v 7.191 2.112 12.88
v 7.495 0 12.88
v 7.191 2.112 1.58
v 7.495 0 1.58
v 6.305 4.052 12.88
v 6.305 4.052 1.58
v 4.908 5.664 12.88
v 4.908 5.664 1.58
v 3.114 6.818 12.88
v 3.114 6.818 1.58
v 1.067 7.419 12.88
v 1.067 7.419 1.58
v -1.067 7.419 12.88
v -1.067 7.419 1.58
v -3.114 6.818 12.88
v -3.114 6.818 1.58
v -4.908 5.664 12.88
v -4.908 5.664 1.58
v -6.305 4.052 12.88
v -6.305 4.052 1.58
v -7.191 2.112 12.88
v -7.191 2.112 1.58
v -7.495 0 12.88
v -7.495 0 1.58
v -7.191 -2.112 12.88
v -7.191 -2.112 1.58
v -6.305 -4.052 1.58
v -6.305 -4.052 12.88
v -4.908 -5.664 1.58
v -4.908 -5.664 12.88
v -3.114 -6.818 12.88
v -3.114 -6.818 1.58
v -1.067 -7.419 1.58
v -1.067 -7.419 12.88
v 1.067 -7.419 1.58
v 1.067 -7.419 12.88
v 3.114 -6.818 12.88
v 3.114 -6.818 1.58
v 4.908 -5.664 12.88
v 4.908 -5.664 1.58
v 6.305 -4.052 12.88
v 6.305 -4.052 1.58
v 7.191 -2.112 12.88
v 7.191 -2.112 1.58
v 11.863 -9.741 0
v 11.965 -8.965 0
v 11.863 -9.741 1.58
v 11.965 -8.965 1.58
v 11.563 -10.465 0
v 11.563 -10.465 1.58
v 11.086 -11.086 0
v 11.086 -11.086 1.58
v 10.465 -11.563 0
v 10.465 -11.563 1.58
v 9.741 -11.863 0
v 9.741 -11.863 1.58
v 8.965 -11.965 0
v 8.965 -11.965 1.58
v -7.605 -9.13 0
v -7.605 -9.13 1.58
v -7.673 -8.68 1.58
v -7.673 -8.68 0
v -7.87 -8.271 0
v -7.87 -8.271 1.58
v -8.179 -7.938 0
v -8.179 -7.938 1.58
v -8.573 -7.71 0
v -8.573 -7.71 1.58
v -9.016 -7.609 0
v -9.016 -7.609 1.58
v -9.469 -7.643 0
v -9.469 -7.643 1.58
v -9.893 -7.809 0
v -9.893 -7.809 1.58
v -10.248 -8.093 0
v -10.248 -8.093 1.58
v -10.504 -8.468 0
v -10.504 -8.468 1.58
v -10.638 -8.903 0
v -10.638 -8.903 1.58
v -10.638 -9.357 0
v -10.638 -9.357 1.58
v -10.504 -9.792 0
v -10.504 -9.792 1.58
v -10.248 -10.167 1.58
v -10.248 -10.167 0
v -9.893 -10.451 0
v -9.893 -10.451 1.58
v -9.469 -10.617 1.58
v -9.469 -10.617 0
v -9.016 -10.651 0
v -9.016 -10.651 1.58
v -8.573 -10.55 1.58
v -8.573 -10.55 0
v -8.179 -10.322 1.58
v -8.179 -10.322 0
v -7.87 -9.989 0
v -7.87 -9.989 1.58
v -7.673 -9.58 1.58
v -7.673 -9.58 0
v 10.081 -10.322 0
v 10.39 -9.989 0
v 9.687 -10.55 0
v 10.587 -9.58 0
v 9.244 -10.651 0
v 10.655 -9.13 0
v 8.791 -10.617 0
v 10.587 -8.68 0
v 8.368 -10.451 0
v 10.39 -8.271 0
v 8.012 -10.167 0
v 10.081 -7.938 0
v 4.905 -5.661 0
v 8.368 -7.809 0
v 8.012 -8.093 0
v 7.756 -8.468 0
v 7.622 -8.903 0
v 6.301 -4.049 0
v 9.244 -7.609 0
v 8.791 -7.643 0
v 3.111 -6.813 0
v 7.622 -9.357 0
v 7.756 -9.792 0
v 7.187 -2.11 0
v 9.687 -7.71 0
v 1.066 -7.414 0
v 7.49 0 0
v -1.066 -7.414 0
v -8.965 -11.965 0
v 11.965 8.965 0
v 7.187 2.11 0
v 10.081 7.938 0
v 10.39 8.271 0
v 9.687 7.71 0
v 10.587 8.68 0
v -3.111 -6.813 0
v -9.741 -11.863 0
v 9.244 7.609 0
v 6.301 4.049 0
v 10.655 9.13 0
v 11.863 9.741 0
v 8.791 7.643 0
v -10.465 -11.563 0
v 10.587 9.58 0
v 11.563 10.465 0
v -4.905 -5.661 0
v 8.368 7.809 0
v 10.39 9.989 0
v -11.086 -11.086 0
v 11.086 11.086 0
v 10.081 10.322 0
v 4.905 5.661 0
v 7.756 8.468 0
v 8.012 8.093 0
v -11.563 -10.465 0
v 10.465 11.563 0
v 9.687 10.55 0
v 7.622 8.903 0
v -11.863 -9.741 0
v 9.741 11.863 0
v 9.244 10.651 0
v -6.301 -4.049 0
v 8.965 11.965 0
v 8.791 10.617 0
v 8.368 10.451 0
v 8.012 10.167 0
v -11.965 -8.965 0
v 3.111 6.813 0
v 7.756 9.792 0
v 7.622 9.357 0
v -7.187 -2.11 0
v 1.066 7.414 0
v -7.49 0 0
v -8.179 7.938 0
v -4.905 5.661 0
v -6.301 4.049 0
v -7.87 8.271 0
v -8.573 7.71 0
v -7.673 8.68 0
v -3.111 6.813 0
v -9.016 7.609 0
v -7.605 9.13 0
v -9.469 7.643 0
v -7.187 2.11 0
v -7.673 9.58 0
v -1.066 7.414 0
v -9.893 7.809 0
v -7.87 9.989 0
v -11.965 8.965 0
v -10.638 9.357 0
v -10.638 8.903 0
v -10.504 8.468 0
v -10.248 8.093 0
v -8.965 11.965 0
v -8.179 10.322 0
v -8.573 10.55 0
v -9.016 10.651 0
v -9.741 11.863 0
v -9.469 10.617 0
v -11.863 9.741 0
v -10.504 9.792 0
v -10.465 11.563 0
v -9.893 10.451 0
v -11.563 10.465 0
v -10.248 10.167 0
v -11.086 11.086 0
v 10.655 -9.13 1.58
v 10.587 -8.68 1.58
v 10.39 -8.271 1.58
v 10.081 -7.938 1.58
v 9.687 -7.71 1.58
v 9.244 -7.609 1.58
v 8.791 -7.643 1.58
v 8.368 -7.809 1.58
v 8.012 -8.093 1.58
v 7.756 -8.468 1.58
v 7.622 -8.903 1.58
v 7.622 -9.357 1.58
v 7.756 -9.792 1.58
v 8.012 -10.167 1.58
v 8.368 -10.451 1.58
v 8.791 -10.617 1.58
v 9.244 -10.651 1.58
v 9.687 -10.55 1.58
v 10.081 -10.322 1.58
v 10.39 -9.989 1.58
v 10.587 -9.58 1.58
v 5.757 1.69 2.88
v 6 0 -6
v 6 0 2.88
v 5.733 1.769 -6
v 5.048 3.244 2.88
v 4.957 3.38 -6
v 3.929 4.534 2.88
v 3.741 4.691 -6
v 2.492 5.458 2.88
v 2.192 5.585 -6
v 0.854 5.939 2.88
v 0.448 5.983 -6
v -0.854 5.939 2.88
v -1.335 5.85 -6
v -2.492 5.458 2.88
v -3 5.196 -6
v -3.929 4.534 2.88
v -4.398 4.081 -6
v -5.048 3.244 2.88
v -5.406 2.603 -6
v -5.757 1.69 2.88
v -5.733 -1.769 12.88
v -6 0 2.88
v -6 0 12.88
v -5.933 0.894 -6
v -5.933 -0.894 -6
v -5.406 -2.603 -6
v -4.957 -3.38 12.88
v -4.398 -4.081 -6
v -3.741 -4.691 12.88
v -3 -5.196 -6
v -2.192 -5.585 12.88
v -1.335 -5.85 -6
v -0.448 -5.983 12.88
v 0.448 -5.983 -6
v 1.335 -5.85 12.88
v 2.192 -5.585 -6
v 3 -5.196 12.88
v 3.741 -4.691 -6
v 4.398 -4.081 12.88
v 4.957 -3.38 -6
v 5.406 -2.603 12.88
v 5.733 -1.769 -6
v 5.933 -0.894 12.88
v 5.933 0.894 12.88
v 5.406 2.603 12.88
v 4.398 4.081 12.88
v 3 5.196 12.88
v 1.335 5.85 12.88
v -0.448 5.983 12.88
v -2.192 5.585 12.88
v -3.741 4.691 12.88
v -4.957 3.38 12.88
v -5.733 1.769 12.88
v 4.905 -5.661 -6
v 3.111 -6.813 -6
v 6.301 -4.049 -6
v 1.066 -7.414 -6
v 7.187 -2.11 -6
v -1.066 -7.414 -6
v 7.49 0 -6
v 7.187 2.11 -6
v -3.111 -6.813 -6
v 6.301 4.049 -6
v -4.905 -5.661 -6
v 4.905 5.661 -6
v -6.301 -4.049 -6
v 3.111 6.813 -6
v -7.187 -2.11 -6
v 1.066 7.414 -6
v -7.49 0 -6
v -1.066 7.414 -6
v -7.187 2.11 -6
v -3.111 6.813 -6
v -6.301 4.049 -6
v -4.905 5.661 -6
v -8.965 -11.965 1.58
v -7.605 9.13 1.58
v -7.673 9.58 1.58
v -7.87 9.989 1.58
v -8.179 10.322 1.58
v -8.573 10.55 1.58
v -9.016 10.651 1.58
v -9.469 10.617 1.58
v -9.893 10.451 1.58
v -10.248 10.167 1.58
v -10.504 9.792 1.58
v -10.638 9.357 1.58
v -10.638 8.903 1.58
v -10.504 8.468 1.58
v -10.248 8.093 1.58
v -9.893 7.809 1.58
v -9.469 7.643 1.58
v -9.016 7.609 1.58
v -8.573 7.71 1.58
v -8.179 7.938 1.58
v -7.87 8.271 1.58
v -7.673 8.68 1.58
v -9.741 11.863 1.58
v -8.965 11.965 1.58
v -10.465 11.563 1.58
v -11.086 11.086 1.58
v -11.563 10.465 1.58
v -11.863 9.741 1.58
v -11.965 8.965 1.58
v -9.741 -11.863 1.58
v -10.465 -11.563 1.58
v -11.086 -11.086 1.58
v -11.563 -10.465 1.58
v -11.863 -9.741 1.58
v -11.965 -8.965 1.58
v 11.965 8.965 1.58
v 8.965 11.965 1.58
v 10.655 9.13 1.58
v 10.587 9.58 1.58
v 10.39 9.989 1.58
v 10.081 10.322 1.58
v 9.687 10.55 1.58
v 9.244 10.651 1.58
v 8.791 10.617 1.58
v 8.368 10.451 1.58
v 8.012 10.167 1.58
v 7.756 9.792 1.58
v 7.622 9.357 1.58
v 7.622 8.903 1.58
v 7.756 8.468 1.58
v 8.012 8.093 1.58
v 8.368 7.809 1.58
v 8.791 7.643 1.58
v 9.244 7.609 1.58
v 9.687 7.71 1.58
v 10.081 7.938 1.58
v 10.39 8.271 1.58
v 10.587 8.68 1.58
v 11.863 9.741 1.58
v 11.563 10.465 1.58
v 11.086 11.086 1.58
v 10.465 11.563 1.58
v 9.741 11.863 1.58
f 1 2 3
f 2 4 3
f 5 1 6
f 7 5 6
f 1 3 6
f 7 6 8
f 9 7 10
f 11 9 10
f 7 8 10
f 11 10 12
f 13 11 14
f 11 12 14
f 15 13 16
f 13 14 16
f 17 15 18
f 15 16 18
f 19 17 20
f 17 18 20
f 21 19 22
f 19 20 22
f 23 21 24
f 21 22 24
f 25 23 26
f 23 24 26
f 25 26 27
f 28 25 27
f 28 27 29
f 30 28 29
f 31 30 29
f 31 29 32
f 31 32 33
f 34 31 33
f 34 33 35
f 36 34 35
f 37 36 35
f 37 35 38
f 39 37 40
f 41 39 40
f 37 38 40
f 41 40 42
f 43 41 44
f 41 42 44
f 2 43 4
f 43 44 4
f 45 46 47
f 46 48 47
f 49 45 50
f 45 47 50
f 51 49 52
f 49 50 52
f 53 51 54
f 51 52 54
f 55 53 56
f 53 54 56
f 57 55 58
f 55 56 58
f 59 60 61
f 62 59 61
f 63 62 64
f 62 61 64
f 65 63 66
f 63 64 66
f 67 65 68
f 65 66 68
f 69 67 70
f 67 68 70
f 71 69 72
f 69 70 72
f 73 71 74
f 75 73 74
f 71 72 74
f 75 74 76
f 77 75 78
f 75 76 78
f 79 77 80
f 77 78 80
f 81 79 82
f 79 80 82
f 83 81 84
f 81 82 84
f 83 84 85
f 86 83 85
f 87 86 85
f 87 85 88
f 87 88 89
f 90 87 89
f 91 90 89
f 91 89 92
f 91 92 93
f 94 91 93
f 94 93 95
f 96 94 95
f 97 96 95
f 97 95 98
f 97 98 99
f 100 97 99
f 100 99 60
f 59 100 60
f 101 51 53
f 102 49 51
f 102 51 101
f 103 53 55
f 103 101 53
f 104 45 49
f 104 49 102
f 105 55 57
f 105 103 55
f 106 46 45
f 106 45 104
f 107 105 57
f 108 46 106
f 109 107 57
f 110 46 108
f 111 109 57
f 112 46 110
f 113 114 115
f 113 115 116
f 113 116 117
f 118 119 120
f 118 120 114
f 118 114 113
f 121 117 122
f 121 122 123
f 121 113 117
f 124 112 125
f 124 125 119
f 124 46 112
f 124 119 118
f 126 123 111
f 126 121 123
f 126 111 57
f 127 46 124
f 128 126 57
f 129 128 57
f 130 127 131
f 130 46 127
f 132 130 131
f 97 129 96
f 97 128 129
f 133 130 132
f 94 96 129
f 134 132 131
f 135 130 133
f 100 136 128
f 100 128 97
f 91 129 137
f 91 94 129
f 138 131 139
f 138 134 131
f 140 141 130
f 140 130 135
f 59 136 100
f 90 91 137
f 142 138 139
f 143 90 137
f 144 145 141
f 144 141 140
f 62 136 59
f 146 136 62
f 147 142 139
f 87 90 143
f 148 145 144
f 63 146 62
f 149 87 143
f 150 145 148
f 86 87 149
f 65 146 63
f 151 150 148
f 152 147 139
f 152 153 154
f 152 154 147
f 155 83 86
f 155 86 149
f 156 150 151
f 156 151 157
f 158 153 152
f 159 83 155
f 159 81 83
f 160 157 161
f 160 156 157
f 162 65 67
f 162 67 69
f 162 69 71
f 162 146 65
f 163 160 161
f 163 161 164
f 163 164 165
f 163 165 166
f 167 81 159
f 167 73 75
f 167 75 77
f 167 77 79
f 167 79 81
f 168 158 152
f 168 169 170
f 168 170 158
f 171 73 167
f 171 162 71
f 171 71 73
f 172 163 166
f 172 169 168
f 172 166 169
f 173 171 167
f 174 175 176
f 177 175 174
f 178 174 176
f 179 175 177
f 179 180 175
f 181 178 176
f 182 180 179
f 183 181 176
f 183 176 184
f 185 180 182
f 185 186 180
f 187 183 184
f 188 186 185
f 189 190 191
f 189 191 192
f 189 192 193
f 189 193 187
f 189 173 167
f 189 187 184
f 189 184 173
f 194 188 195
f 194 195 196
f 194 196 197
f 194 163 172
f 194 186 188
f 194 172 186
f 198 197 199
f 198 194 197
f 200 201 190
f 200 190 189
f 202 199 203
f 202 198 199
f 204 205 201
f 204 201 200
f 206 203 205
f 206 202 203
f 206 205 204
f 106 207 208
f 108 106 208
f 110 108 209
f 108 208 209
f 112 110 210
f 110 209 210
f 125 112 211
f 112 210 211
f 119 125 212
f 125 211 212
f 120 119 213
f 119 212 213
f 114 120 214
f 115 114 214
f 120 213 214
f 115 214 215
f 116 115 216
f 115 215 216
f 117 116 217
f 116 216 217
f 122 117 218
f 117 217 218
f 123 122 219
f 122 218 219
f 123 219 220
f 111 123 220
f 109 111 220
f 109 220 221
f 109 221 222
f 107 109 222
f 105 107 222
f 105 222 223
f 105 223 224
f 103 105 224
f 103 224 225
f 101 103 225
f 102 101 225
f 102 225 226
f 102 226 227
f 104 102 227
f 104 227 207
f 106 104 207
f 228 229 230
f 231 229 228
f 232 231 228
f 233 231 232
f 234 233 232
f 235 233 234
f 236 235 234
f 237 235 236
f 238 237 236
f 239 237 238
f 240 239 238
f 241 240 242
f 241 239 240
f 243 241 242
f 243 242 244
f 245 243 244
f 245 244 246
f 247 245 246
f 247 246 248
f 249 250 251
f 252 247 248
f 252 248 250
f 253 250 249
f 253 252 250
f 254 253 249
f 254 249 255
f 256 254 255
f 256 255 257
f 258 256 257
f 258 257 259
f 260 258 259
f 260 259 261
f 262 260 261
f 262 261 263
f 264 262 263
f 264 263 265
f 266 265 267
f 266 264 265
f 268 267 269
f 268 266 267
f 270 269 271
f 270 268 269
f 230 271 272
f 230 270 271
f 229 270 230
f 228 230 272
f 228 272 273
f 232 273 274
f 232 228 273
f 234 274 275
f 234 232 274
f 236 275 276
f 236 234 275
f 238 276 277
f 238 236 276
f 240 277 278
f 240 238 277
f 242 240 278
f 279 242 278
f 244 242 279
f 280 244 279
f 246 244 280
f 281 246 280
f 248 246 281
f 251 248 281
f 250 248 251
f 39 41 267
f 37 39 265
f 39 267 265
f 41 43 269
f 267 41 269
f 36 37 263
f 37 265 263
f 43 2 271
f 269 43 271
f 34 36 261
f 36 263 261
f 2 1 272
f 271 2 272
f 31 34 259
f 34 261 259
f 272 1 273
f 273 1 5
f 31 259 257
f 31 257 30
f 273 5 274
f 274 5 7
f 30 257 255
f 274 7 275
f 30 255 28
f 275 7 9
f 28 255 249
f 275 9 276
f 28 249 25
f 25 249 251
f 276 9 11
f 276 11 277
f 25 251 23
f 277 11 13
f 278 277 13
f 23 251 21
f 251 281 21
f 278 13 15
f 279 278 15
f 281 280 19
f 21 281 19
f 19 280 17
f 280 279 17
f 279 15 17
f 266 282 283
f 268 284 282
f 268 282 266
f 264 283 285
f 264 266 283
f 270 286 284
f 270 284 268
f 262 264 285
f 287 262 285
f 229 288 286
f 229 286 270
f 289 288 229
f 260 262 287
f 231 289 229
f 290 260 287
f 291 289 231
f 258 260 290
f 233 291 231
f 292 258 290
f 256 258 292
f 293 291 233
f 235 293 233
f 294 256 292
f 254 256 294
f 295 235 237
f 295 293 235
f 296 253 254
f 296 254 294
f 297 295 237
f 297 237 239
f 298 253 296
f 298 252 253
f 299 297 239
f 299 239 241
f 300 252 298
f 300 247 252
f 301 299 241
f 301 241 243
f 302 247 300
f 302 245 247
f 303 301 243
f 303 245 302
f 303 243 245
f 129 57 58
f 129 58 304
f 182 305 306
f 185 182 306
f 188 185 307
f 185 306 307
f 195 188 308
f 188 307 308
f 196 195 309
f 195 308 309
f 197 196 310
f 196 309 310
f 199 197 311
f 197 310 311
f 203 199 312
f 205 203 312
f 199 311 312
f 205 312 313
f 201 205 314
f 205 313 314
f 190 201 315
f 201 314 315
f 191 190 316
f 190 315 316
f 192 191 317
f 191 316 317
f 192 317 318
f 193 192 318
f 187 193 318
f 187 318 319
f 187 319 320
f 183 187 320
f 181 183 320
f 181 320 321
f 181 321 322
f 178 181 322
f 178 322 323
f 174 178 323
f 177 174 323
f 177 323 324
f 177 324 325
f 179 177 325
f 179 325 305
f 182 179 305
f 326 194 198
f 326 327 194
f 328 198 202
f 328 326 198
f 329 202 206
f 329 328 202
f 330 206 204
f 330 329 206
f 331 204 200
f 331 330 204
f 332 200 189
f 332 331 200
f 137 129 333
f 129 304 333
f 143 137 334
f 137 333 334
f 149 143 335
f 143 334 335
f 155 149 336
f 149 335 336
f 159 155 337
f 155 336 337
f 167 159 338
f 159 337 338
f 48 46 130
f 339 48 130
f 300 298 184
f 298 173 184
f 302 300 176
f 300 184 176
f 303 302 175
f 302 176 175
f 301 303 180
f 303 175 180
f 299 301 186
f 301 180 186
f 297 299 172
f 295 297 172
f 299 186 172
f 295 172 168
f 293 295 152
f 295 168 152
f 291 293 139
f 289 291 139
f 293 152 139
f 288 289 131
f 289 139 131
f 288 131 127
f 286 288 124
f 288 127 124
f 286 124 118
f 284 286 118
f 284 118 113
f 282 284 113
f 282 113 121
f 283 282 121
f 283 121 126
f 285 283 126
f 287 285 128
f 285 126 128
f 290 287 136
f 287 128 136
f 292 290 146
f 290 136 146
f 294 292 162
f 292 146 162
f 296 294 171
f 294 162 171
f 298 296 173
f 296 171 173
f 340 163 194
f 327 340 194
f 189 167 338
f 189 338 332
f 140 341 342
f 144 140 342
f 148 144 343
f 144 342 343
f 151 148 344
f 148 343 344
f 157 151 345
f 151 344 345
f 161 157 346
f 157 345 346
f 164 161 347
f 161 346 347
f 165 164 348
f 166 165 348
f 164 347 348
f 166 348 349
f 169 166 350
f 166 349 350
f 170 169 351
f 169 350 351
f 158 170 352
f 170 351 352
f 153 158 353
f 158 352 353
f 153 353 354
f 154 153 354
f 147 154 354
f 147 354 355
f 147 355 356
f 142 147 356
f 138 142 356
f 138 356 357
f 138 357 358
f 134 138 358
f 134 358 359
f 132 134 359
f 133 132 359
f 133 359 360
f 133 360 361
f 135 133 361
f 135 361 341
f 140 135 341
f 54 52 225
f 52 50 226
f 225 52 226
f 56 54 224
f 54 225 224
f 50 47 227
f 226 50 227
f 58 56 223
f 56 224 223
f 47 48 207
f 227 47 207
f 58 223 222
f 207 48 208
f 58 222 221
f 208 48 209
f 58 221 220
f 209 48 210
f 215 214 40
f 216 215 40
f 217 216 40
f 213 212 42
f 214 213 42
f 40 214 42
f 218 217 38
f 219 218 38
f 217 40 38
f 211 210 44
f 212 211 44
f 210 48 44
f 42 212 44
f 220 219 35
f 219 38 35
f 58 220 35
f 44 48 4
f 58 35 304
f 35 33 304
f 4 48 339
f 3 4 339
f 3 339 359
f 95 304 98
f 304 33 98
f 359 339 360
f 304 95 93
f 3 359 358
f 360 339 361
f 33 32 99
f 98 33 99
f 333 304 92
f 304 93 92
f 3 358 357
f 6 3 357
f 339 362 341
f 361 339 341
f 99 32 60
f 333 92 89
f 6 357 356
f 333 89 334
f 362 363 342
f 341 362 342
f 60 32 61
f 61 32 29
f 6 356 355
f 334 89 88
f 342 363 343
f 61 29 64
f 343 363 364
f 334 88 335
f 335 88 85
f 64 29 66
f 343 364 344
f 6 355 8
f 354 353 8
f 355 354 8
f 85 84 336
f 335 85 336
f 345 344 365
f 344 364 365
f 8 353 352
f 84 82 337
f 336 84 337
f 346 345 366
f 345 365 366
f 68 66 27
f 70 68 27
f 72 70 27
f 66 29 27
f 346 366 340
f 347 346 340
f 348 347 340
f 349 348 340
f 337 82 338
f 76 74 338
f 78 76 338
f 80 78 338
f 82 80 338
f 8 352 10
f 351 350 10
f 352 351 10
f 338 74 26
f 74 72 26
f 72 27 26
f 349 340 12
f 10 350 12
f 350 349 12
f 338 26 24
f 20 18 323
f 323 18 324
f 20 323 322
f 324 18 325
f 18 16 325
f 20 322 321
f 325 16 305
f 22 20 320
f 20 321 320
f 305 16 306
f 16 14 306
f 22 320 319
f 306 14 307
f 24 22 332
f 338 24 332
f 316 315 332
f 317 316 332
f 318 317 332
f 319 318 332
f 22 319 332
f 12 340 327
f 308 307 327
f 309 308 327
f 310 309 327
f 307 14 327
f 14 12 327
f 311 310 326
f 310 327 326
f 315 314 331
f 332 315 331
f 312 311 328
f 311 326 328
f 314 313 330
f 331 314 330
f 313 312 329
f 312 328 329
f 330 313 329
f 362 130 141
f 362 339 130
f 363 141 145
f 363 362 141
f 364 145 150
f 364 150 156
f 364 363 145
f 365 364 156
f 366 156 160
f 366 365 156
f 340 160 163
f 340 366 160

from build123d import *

# Parameters (mm, degrees)
SKETCH_1_W                  = 23.93
SKETCH_1_H                  = 23.93
EXTRUDE_1_DEPTH             = 1.58
SKETCH_2_W                  = 7.495
SKETCH_2_H                  = 11.3
SKETCH_3_W                  = 7.49
SKETCH_3_H                  = 7.44
HOLE_WIZARD_M2_51_D         = 3.05
HOLE_WIZARD_M2_51_DEPTH     = 12.88
HOLE_WIZARD_12_0_12_1_D     = 12
HOLE_WIZARD_12_0_12_1_DEPTH = 10
FILLET_1_R                  = 3
CUT_EXTRUDE_START           = -15
SKETCH_8_R                  = 6
CUT_EXTRUDE_1_DEPTH         = 15
SKETCH_9_R                  = 7.49
SKETCH_9_R_2                = 6
CUT_EXTRUDE_3_DEPTH         = 1.44


with BuildPart() as part:
    # Эскиз1 → Бобышка-Вытянуть1 (new body)
    with BuildSketch(Plane(origin=(0, 0, 0), x_dir=(-1, 0, 0), z_dir=(0, 0, -1))):
        Rectangle(SKETCH_1_W, SKETCH_1_H)
    extrude(amount=-EXTRUDE_1_DEPTH)

    # Эскиз2 → Повернуть1 (revolve)
    with BuildSketch(Plane(origin=(0, 0, 0), x_dir=(1, 0, 0), z_dir=(0, 1, 0))):
        with Locations((3.7475, -7.23)):
            Rectangle(SKETCH_2_W, SKETCH_2_H)
    revolve(axis=Axis((0, 0, 1.58), (0, 0, 1)))

    # Эскиз3 → Повернуть2 (revolve)
    with BuildSketch(Plane.XZ, mode=Mode.PRIVATE) as revolve_2_sk:
        with Locations((3.745, -3.72)):
            Rectangle(SKETCH_3_W, SKETCH_3_H)
    revolve(revolve_2_sk.sketch.rotate(Axis((0, 0, 0), (0, 0, -1)), 180), axis=Axis((0, 0, 0), (0, 0, -1)))

    # Отверстие с зазором M2.51
    with Locations(Plane(origin=(0, 0, 0), x_dir=(-1, 0, 0), z_dir=(0, 0, -1))):
        with Locations((9.13, -9.13), (9.13, 9.13), (-9.13, 9.13), (-9.13, -9.13)):
            Hole(HOLE_WIZARD_M2_51_D / 2, depth=HOLE_WIZARD_M2_51_DEPTH)

    # Диаметр отверстия Ø12.0 (12)1
    with Locations(Plane.XY.offset(12.88)):
        with Locations((0, 0)):
            Hole(HOLE_WIZARD_12_0_12_1_D / 2, depth=HOLE_WIZARD_12_0_12_1_DEPTH)

    # Скругление1
    fillet_1_edges = [part.edges().sort_by_distance(p)[0] for p in [
        (11.965, -11.965, 0.79),
        (11.965, 11.965, 0.79),
        (-11.965, 11.965, 0.79),
        (-11.965, -11.965, 0.79),
    ]]
    fillet(fillet_1_edges, radius=FILLET_1_R)

    # Эскиз8 → Вырез-Вытянуть1 (cut)
    with BuildSketch(Plane.XY.offset(2.88).offset(CUT_EXTRUDE_START)):
        Circle(SKETCH_8_R)
    extrude(amount=CUT_EXTRUDE_1_DEPTH, mode=Mode.SUBTRACT)

    # Эскиз9 → Вырез-Вытянуть3 (cut)
    with BuildSketch(Plane(origin=(0, 0, -7.44), x_dir=(-1, 0, 0), z_dir=(0, 0, -1))):
        Circle(SKETCH_9_R)
        with Locations(Location((0, 0, 0), (0, 0, 180))):
            Circle(SKETCH_9_R_2, mode=Mode.SUBTRACT)
    extrude(amount=-CUT_EXTRUDE_3_DEPTH, mode=Mode.SUBTRACT)


solid = part.part
